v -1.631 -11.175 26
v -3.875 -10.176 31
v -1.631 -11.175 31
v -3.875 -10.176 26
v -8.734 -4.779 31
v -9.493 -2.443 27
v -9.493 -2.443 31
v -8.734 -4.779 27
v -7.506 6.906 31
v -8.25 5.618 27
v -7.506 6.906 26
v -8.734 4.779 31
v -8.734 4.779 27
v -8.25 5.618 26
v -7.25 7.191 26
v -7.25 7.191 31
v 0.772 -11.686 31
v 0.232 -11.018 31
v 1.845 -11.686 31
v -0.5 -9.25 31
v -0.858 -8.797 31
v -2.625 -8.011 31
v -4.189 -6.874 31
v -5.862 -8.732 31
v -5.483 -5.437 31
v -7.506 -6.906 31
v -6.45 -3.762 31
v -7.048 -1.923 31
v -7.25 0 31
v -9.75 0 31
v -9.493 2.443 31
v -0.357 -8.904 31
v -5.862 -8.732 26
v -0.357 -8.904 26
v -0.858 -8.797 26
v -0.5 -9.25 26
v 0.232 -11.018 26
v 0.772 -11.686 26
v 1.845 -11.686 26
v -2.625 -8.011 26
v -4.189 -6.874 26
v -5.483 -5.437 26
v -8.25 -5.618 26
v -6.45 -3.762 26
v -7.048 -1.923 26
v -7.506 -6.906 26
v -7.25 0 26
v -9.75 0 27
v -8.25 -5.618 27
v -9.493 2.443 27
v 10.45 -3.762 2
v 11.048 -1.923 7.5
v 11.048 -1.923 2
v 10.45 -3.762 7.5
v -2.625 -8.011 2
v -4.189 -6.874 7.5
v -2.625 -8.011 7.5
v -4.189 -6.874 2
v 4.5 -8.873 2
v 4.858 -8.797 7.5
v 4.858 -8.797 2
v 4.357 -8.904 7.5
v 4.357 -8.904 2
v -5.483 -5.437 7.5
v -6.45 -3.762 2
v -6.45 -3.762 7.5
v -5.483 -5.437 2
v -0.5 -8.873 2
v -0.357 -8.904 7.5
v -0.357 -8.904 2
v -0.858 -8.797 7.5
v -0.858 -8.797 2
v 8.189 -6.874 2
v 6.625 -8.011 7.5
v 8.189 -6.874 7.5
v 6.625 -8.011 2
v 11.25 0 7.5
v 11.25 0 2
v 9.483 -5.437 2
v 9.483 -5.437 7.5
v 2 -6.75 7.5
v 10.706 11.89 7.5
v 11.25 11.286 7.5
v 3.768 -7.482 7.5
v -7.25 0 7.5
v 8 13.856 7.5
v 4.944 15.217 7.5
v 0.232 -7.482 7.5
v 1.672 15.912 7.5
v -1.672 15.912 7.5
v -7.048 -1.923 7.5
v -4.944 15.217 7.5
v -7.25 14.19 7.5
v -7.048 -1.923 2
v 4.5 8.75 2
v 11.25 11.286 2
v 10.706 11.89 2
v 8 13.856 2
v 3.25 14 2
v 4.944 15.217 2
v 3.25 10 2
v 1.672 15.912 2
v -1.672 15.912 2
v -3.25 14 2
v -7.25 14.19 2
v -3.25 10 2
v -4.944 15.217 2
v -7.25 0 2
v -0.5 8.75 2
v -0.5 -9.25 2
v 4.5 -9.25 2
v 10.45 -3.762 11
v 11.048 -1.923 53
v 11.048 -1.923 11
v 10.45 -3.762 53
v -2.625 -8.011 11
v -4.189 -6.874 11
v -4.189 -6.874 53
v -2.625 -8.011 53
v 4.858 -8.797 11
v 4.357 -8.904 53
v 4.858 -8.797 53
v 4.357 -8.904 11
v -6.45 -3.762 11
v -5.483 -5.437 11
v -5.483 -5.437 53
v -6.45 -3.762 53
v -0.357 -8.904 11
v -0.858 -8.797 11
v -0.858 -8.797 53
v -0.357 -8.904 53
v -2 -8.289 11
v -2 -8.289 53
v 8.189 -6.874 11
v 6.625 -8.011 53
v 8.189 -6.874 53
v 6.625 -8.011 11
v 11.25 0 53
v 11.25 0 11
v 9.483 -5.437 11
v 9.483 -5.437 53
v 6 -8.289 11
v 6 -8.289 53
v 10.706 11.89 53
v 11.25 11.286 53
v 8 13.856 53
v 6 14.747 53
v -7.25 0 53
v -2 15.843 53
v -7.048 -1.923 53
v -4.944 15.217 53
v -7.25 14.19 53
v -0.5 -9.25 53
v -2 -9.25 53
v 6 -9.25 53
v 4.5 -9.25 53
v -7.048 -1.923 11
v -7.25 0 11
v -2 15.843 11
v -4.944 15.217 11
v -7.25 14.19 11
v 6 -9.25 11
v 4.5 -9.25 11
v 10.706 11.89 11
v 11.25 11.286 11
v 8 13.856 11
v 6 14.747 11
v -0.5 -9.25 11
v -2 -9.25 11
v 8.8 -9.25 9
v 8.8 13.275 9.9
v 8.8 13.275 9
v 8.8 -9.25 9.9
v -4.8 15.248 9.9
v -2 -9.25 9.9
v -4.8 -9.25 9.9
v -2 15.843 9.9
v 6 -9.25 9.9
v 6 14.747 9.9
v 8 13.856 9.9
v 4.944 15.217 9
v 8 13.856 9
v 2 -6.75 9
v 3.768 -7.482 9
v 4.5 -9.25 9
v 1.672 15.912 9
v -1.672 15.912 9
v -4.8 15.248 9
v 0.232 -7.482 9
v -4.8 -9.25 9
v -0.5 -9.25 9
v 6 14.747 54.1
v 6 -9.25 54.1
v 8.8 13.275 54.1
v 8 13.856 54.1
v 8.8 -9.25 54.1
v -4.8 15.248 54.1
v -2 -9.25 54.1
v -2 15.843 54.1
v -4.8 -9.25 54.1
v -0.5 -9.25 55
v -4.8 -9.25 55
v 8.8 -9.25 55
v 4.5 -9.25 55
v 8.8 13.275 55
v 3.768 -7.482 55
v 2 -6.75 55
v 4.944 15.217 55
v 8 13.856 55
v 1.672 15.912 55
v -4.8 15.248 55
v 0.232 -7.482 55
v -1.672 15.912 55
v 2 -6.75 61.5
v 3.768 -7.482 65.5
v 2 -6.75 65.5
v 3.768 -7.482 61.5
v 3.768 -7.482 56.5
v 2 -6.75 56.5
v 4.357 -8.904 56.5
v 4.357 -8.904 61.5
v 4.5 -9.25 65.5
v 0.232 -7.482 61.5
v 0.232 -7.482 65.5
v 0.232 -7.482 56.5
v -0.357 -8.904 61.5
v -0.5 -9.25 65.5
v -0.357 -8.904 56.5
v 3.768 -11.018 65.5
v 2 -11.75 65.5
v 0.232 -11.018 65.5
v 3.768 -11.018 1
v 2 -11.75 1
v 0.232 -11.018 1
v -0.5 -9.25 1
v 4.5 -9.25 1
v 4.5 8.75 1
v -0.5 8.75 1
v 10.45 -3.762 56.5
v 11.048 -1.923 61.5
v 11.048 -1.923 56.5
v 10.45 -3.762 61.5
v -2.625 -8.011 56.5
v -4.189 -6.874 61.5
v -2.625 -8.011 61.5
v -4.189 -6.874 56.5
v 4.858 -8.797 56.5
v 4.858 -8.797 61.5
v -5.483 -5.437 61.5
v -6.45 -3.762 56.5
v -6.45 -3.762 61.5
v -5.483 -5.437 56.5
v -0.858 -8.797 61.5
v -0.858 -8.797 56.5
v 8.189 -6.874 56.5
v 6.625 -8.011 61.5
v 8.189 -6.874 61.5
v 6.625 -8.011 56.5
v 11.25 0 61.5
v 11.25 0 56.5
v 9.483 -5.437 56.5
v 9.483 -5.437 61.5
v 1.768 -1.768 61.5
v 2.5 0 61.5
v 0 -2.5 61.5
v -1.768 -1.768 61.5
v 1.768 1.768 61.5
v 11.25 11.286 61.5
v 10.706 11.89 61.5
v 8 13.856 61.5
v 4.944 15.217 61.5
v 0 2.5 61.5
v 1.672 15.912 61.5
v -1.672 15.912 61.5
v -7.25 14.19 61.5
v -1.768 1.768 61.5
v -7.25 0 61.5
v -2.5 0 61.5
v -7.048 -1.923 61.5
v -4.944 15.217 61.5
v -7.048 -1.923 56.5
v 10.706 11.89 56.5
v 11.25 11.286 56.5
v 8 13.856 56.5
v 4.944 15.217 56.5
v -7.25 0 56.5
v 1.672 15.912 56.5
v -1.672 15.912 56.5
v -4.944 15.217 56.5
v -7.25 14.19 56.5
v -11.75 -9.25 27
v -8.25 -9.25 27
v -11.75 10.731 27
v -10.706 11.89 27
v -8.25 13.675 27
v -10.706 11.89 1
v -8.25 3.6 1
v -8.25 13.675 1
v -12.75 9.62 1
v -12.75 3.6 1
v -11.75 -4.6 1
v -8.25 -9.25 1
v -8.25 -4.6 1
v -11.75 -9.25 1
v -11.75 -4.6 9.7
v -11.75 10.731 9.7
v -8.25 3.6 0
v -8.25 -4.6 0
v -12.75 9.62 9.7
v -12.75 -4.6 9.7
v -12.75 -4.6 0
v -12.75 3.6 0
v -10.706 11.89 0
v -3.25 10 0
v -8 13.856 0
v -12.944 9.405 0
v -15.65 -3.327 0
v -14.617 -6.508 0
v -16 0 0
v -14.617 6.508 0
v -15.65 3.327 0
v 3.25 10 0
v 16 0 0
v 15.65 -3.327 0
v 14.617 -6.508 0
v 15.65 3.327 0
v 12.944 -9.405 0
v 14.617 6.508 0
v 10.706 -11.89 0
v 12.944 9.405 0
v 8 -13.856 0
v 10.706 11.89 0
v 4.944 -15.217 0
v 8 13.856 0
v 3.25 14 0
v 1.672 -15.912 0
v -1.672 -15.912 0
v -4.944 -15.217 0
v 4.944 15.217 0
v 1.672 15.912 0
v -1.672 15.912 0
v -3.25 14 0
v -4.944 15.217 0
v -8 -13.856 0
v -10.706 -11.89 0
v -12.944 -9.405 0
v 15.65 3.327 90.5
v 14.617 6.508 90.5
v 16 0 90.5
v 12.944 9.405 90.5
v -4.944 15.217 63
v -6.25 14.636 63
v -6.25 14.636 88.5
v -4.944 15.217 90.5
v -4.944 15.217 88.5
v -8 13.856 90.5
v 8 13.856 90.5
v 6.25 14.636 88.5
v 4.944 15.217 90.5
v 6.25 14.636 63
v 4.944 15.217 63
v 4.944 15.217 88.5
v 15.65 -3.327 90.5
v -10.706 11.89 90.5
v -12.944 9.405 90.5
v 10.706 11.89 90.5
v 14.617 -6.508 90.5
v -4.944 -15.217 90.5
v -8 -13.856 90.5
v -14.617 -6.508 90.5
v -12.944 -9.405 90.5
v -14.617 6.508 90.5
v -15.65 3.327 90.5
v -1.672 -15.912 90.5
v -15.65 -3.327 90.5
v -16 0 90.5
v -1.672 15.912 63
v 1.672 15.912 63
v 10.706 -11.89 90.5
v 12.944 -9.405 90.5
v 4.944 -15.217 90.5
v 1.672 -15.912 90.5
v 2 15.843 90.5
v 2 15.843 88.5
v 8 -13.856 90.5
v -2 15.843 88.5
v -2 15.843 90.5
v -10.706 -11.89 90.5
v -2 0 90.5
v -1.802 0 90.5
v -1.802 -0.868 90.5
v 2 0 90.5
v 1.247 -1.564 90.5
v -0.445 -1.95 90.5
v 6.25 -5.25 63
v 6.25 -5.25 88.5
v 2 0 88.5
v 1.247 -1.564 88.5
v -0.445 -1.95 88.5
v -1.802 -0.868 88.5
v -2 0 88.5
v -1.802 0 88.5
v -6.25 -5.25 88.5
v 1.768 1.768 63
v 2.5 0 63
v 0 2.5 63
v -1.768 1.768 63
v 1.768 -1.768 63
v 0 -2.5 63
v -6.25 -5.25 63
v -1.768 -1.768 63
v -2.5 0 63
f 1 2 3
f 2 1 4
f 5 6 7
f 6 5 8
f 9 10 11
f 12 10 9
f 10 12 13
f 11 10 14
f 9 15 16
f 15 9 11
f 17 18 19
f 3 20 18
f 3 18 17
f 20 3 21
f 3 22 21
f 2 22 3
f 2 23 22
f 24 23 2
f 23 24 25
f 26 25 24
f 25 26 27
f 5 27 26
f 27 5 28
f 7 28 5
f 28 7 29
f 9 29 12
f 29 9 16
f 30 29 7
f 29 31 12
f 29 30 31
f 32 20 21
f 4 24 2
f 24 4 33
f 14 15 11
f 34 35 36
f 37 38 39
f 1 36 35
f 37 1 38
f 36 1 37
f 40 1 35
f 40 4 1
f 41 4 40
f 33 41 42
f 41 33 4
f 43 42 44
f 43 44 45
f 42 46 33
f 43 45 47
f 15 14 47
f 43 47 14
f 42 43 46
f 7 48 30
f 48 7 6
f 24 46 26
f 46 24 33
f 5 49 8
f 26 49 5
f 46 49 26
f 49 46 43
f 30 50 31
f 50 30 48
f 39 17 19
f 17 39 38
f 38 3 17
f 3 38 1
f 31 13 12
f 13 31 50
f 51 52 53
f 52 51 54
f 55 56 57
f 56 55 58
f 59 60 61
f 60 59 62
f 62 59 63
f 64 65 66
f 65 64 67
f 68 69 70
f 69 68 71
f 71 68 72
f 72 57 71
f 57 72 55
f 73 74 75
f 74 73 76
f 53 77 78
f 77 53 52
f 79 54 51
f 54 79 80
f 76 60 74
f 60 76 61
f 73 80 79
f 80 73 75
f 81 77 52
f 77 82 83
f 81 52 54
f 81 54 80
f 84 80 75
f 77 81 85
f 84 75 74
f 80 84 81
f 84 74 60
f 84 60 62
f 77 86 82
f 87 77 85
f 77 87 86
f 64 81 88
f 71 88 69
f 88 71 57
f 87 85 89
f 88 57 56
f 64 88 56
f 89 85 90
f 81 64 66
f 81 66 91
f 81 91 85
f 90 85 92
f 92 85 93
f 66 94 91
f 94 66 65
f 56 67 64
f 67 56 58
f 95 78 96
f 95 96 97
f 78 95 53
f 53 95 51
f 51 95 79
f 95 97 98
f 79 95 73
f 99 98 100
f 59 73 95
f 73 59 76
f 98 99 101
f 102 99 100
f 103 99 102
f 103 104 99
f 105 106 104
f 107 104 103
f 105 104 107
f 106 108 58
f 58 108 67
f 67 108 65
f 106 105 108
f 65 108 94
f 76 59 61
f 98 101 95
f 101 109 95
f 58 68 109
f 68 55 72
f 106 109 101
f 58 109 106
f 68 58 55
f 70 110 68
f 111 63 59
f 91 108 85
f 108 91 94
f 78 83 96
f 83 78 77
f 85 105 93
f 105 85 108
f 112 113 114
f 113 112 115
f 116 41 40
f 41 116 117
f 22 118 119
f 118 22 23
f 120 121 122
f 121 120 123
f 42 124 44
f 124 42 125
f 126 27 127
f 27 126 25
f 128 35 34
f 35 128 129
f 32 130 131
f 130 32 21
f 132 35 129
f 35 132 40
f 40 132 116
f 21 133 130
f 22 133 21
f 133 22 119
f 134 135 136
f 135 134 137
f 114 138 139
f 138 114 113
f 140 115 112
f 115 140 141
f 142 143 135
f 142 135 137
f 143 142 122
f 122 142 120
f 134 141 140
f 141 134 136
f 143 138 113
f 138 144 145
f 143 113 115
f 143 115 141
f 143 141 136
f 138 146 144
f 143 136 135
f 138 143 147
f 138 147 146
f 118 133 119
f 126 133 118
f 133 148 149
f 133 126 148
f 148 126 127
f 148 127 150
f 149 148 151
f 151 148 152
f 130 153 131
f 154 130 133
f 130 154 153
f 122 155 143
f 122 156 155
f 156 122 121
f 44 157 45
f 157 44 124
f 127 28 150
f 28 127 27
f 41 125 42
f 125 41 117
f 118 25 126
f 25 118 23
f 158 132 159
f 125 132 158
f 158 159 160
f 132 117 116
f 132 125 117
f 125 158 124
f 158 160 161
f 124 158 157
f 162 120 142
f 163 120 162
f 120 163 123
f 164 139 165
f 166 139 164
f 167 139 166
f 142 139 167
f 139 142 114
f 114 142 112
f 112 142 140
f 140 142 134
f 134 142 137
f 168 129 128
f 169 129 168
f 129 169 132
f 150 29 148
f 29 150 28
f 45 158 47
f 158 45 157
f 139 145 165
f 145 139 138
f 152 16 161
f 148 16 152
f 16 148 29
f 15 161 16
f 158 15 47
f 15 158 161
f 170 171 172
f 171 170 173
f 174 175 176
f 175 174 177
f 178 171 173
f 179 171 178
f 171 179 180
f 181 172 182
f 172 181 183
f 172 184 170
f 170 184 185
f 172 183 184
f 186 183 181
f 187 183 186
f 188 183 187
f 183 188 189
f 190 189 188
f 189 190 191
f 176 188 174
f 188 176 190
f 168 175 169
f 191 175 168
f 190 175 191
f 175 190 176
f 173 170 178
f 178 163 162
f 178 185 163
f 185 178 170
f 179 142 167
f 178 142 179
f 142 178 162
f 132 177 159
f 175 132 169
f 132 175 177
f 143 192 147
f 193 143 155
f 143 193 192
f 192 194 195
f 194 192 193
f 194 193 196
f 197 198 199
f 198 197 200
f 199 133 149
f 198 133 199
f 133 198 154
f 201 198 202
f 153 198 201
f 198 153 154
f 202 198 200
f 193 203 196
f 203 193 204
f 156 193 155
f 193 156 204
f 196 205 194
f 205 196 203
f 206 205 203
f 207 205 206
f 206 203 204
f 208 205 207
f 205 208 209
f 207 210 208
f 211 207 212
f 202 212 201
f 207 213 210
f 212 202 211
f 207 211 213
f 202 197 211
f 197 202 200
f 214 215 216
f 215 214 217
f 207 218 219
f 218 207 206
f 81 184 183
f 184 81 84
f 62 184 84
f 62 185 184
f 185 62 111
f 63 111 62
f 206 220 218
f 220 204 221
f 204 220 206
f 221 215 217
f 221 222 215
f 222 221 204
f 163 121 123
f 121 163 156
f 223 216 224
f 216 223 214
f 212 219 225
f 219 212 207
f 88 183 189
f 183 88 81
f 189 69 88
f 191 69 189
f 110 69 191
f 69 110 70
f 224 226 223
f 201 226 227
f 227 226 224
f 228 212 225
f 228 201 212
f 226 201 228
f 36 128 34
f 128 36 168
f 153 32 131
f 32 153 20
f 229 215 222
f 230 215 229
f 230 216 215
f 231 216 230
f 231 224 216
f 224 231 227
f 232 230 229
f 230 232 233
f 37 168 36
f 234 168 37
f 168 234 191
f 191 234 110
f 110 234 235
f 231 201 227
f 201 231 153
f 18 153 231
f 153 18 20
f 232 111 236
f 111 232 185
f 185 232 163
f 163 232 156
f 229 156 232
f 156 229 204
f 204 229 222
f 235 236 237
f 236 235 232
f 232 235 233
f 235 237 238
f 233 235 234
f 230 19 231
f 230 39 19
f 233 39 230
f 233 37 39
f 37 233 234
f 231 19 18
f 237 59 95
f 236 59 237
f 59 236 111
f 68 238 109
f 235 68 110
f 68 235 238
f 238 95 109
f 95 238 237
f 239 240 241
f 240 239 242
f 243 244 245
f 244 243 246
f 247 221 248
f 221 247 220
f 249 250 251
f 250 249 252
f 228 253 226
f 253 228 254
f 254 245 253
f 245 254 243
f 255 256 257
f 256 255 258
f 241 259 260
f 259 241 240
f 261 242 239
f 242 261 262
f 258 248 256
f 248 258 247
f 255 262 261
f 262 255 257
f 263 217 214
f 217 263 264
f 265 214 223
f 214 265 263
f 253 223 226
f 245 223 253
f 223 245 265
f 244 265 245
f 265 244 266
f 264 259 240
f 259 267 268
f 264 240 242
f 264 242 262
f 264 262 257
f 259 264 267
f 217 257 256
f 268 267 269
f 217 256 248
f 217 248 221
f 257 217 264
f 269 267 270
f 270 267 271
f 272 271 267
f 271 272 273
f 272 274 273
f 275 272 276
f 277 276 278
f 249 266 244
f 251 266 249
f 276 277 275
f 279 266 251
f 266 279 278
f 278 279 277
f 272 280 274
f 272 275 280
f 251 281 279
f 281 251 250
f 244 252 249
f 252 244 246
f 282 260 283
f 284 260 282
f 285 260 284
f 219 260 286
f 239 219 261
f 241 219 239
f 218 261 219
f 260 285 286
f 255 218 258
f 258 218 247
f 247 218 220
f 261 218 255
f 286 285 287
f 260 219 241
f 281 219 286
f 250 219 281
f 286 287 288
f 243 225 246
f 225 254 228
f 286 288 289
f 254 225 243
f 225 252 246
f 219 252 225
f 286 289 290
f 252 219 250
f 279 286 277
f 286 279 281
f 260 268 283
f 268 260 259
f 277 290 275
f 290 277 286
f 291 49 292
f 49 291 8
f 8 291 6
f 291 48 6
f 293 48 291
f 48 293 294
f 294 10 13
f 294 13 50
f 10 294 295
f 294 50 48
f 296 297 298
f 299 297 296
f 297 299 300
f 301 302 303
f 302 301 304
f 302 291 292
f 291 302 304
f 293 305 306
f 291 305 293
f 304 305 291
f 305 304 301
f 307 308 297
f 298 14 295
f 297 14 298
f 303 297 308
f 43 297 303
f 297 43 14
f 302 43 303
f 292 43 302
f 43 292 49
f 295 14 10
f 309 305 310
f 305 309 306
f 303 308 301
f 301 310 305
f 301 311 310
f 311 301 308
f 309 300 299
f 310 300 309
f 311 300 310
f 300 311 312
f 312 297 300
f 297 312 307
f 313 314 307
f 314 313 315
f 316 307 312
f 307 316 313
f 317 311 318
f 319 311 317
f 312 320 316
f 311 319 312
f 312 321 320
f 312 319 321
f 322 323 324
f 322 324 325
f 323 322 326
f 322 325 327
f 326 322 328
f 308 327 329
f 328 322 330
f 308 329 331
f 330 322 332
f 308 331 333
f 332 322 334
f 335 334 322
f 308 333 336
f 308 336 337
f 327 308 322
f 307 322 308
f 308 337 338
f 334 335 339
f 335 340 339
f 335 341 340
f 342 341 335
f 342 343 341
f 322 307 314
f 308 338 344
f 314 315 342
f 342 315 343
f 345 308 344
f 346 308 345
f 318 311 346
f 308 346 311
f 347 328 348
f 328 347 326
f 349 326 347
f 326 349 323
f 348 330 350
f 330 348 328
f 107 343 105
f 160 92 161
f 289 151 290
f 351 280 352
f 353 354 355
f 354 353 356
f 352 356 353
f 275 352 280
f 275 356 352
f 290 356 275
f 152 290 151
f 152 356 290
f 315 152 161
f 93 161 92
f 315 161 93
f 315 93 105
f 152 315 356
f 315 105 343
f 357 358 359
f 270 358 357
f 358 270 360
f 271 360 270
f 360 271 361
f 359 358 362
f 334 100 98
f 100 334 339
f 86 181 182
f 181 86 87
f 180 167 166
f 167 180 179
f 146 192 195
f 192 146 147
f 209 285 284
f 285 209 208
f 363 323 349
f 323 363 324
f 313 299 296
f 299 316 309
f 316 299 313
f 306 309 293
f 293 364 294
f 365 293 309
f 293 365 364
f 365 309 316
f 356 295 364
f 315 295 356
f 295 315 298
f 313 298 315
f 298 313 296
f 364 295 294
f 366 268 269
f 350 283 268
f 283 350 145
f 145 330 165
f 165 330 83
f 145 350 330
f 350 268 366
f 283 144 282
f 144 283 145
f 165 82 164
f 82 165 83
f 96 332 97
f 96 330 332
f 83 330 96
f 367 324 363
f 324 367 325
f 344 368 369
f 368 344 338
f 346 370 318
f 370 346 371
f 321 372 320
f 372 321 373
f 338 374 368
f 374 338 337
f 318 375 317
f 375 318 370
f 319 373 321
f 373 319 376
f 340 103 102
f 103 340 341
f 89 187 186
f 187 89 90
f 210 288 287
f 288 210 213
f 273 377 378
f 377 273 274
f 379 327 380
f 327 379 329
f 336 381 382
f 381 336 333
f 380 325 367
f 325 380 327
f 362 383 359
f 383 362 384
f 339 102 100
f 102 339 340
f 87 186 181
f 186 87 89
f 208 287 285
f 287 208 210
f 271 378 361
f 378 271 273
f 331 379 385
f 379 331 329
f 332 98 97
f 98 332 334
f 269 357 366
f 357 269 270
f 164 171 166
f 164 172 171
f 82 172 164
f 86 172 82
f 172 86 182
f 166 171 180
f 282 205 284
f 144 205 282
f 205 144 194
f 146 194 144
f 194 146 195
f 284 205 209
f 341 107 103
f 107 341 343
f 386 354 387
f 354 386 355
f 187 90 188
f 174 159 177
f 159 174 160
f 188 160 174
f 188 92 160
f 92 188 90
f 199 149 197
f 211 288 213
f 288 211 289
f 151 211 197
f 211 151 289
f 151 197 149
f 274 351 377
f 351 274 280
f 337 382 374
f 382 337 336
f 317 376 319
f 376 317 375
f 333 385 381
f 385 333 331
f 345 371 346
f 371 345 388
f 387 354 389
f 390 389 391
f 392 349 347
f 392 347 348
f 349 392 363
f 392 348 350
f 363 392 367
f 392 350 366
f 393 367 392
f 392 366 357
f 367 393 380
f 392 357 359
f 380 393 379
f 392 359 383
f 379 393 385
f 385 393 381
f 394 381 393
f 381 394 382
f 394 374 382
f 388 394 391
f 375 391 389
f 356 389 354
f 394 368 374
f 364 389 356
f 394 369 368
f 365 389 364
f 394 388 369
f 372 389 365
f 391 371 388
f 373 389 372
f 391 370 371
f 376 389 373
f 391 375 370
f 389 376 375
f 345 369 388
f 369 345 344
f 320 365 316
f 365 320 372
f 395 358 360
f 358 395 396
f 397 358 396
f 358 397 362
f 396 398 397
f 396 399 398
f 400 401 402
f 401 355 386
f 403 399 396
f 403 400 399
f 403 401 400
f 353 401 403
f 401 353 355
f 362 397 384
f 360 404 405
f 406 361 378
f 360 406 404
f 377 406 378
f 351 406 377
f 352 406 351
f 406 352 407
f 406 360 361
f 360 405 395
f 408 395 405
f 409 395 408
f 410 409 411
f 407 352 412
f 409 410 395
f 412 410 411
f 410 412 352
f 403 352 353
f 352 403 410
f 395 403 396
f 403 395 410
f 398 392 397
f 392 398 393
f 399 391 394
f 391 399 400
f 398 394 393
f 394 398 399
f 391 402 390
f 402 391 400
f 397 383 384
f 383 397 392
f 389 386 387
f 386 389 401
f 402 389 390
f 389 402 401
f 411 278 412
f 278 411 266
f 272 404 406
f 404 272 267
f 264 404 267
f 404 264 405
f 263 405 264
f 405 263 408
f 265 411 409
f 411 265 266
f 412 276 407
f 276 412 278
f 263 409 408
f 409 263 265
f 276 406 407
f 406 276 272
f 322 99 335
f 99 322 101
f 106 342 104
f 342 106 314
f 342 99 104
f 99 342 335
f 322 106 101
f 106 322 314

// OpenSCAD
//$fn = 256;

height = 90.5;
outer_d = 32;

magnet_h = 5.5;
magnet_d = 18.5;

battery_h = 42;
battery_d = 18.5;

splitter_disc_h = 2;

battery_contact_spacer = 3.5;
battery_contact_slot_dim = [13.6, outer_d, 0.9];
battery_contact_cutout_dim = [8, outer_d, 1.1];

fet_h = 5;
fet_d = magnet_d;

motor_dim = [12.5, 10.5, 25.5];
motor_shaft_d = 4;

charger_dim = [17.5, 3.5, 26];
charger_conn_dim = [8.2, 4.5, 8.7];

button_dims = [6.5, 4, 3.5];

wire_duct_d = 5;


difference() {
    // body
    //cylinder(h=60, d=outer_d);
    cylinder(h=height, d=outer_d);
    
    translate([2, 0, 0]) union() {
        // magnet
        translate([0, 0, splitter_disc_h]) cylinder(h=magnet_h, d=magnet_d);
        // magnet top cut-out
        translate([-magnet_d / 2, 0, splitter_disc_h]) cube([magnet_d, outer_d / 2, magnet_h]);
        
        // battery
        battery_bottom_z = splitter_disc_h + magnet_h + battery_contact_spacer;
        battery_top_z = battery_bottom_z + battery_h;
        translate([0, 0, battery_bottom_z]) cylinder(h=battery_h, d=battery_d);
        // battery top cut-out
        translate([-battery_d / 2, 0, battery_bottom_z]) cube([battery_d, outer_d / 2, battery_h]);
        
        // battery contact holder bottom
        translate([-battery_contact_slot_dim.x / 2, -battery_d / 2, battery_bottom_z - (battery_contact_slot_dim.z + battery_contact_cutout_dim.z)])
            cube(battery_contact_slot_dim);
        translate([-battery_contact_cutout_dim.x / 2, -battery_d / 2, battery_bottom_z - battery_contact_cutout_dim.z])
            cube(battery_contact_cutout_dim);
        // battery contact holder top
        translate([-battery_contact_cutout_dim.x / 2, -battery_d / 2, battery_top_z])
            cube(battery_contact_cutout_dim);
        translate([-battery_contact_slot_dim.x / 2, -battery_d / 2, battery_top_z + battery_contact_cutout_dim.z])
            cube(battery_contact_slot_dim);
        
        // wire duct axial
        axial_wire_duct_bottom_z = splitter_disc_h / 2;
        axial_wire_duct_length = axial_wire_duct_bottom_z + battery_top_z + battery_contact_spacer + splitter_disc_h + fet_h;
        translate([0, -battery_d / 2 , axial_wire_duct_bottom_z])
            cylinder(h=axial_wire_duct_length, d=wire_duct_d);
        
        // wire duct below magnet
        translate([-wire_duct_d / 2, -battery_d / 2, splitter_disc_h / 2])
            cube([wire_duct_d, outer_d / 2 + 2, splitter_disc_h / 2]);
        // wire duct to charger
        translate([0, 0, charger_dim.z]) difference() {
            cylinder(h=wire_duct_d, d=battery_d + wire_duct_d);
            translate([0, -(battery_d + wire_duct_d)/2 , 0])
                cube([battery_d + wire_duct_d, battery_d + wire_duct_d, wire_duct_d]);
        }
        
        // fet
        fet_bottom_z = battery_top_z + battery_contact_spacer;
        translate([0, 0, fet_bottom_z]) cylinder(h=fet_h, d=fet_d);
        // fet top cut-out
        translate([-fet_d / 2, 0, fet_bottom_z]) cube([fet_d, outer_d / 2, fet_h]);
    }
    
    // motor
    translate([-motor_dim.x / 2, -motor_dim.y / 2, height - splitter_disc_h - motor_dim.z])
        cube([motor_dim.x, motor_dim.y, motor_dim.z]);
    // motor top cut-out
    translate([-motor_dim.x / 2, 0, height - splitter_disc_h - motor_dim.z])
        cube([motor_dim.x, outer_d / 2, motor_dim.z]);
    
    // motor shaft cut-out
    translate([0, 0, height - splitter_disc_h]) cylinder(h=splitter_disc_h, d=motor_shaft_d);
    translate([-motor_shaft_d / 2, 0, height - splitter_disc_h]) cube([motor_shaft_d, outer_d / 2, splitter_disc_h]);
    
    // motor - fet wire duct
    translate([0, 0, height - splitter_disc_h - motor_dim.z -wire_duct_d]) cylinder(h=wire_duct_d, d=wire_duct_d);
    
    // charger
    translate([-battery_d / 2 + 1, -battery_d / 2, splitter_disc_h / 2]) rotate([0, 0, 90]) union() {
        cube([charger_dim.x * 2.5, charger_dim.y, charger_dim.z]);
        charger_conn_x_off = charger_dim.x / 2 - charger_conn_dim.x / 2;
        translate([charger_conn_x_off, 0, 0])
            cube([charger_conn_dim.x * 2.5, charger_conn_dim.y, charger_conn_dim.z]);
        // bottom cut-out
        translate([charger_dim.x / 2 - charger_conn_dim.x / 2, 0, -1])
            cube([charger_conn_dim.x, charger_conn_dim.y, charger_conn_dim.z]);
    }
    
    //button
    translate([-button_dims.x / 2, outer_d / 2 - button_dims.y - 2, 0]) cube([button_dims.x, button_dims.y, button_dims.z]);
}
